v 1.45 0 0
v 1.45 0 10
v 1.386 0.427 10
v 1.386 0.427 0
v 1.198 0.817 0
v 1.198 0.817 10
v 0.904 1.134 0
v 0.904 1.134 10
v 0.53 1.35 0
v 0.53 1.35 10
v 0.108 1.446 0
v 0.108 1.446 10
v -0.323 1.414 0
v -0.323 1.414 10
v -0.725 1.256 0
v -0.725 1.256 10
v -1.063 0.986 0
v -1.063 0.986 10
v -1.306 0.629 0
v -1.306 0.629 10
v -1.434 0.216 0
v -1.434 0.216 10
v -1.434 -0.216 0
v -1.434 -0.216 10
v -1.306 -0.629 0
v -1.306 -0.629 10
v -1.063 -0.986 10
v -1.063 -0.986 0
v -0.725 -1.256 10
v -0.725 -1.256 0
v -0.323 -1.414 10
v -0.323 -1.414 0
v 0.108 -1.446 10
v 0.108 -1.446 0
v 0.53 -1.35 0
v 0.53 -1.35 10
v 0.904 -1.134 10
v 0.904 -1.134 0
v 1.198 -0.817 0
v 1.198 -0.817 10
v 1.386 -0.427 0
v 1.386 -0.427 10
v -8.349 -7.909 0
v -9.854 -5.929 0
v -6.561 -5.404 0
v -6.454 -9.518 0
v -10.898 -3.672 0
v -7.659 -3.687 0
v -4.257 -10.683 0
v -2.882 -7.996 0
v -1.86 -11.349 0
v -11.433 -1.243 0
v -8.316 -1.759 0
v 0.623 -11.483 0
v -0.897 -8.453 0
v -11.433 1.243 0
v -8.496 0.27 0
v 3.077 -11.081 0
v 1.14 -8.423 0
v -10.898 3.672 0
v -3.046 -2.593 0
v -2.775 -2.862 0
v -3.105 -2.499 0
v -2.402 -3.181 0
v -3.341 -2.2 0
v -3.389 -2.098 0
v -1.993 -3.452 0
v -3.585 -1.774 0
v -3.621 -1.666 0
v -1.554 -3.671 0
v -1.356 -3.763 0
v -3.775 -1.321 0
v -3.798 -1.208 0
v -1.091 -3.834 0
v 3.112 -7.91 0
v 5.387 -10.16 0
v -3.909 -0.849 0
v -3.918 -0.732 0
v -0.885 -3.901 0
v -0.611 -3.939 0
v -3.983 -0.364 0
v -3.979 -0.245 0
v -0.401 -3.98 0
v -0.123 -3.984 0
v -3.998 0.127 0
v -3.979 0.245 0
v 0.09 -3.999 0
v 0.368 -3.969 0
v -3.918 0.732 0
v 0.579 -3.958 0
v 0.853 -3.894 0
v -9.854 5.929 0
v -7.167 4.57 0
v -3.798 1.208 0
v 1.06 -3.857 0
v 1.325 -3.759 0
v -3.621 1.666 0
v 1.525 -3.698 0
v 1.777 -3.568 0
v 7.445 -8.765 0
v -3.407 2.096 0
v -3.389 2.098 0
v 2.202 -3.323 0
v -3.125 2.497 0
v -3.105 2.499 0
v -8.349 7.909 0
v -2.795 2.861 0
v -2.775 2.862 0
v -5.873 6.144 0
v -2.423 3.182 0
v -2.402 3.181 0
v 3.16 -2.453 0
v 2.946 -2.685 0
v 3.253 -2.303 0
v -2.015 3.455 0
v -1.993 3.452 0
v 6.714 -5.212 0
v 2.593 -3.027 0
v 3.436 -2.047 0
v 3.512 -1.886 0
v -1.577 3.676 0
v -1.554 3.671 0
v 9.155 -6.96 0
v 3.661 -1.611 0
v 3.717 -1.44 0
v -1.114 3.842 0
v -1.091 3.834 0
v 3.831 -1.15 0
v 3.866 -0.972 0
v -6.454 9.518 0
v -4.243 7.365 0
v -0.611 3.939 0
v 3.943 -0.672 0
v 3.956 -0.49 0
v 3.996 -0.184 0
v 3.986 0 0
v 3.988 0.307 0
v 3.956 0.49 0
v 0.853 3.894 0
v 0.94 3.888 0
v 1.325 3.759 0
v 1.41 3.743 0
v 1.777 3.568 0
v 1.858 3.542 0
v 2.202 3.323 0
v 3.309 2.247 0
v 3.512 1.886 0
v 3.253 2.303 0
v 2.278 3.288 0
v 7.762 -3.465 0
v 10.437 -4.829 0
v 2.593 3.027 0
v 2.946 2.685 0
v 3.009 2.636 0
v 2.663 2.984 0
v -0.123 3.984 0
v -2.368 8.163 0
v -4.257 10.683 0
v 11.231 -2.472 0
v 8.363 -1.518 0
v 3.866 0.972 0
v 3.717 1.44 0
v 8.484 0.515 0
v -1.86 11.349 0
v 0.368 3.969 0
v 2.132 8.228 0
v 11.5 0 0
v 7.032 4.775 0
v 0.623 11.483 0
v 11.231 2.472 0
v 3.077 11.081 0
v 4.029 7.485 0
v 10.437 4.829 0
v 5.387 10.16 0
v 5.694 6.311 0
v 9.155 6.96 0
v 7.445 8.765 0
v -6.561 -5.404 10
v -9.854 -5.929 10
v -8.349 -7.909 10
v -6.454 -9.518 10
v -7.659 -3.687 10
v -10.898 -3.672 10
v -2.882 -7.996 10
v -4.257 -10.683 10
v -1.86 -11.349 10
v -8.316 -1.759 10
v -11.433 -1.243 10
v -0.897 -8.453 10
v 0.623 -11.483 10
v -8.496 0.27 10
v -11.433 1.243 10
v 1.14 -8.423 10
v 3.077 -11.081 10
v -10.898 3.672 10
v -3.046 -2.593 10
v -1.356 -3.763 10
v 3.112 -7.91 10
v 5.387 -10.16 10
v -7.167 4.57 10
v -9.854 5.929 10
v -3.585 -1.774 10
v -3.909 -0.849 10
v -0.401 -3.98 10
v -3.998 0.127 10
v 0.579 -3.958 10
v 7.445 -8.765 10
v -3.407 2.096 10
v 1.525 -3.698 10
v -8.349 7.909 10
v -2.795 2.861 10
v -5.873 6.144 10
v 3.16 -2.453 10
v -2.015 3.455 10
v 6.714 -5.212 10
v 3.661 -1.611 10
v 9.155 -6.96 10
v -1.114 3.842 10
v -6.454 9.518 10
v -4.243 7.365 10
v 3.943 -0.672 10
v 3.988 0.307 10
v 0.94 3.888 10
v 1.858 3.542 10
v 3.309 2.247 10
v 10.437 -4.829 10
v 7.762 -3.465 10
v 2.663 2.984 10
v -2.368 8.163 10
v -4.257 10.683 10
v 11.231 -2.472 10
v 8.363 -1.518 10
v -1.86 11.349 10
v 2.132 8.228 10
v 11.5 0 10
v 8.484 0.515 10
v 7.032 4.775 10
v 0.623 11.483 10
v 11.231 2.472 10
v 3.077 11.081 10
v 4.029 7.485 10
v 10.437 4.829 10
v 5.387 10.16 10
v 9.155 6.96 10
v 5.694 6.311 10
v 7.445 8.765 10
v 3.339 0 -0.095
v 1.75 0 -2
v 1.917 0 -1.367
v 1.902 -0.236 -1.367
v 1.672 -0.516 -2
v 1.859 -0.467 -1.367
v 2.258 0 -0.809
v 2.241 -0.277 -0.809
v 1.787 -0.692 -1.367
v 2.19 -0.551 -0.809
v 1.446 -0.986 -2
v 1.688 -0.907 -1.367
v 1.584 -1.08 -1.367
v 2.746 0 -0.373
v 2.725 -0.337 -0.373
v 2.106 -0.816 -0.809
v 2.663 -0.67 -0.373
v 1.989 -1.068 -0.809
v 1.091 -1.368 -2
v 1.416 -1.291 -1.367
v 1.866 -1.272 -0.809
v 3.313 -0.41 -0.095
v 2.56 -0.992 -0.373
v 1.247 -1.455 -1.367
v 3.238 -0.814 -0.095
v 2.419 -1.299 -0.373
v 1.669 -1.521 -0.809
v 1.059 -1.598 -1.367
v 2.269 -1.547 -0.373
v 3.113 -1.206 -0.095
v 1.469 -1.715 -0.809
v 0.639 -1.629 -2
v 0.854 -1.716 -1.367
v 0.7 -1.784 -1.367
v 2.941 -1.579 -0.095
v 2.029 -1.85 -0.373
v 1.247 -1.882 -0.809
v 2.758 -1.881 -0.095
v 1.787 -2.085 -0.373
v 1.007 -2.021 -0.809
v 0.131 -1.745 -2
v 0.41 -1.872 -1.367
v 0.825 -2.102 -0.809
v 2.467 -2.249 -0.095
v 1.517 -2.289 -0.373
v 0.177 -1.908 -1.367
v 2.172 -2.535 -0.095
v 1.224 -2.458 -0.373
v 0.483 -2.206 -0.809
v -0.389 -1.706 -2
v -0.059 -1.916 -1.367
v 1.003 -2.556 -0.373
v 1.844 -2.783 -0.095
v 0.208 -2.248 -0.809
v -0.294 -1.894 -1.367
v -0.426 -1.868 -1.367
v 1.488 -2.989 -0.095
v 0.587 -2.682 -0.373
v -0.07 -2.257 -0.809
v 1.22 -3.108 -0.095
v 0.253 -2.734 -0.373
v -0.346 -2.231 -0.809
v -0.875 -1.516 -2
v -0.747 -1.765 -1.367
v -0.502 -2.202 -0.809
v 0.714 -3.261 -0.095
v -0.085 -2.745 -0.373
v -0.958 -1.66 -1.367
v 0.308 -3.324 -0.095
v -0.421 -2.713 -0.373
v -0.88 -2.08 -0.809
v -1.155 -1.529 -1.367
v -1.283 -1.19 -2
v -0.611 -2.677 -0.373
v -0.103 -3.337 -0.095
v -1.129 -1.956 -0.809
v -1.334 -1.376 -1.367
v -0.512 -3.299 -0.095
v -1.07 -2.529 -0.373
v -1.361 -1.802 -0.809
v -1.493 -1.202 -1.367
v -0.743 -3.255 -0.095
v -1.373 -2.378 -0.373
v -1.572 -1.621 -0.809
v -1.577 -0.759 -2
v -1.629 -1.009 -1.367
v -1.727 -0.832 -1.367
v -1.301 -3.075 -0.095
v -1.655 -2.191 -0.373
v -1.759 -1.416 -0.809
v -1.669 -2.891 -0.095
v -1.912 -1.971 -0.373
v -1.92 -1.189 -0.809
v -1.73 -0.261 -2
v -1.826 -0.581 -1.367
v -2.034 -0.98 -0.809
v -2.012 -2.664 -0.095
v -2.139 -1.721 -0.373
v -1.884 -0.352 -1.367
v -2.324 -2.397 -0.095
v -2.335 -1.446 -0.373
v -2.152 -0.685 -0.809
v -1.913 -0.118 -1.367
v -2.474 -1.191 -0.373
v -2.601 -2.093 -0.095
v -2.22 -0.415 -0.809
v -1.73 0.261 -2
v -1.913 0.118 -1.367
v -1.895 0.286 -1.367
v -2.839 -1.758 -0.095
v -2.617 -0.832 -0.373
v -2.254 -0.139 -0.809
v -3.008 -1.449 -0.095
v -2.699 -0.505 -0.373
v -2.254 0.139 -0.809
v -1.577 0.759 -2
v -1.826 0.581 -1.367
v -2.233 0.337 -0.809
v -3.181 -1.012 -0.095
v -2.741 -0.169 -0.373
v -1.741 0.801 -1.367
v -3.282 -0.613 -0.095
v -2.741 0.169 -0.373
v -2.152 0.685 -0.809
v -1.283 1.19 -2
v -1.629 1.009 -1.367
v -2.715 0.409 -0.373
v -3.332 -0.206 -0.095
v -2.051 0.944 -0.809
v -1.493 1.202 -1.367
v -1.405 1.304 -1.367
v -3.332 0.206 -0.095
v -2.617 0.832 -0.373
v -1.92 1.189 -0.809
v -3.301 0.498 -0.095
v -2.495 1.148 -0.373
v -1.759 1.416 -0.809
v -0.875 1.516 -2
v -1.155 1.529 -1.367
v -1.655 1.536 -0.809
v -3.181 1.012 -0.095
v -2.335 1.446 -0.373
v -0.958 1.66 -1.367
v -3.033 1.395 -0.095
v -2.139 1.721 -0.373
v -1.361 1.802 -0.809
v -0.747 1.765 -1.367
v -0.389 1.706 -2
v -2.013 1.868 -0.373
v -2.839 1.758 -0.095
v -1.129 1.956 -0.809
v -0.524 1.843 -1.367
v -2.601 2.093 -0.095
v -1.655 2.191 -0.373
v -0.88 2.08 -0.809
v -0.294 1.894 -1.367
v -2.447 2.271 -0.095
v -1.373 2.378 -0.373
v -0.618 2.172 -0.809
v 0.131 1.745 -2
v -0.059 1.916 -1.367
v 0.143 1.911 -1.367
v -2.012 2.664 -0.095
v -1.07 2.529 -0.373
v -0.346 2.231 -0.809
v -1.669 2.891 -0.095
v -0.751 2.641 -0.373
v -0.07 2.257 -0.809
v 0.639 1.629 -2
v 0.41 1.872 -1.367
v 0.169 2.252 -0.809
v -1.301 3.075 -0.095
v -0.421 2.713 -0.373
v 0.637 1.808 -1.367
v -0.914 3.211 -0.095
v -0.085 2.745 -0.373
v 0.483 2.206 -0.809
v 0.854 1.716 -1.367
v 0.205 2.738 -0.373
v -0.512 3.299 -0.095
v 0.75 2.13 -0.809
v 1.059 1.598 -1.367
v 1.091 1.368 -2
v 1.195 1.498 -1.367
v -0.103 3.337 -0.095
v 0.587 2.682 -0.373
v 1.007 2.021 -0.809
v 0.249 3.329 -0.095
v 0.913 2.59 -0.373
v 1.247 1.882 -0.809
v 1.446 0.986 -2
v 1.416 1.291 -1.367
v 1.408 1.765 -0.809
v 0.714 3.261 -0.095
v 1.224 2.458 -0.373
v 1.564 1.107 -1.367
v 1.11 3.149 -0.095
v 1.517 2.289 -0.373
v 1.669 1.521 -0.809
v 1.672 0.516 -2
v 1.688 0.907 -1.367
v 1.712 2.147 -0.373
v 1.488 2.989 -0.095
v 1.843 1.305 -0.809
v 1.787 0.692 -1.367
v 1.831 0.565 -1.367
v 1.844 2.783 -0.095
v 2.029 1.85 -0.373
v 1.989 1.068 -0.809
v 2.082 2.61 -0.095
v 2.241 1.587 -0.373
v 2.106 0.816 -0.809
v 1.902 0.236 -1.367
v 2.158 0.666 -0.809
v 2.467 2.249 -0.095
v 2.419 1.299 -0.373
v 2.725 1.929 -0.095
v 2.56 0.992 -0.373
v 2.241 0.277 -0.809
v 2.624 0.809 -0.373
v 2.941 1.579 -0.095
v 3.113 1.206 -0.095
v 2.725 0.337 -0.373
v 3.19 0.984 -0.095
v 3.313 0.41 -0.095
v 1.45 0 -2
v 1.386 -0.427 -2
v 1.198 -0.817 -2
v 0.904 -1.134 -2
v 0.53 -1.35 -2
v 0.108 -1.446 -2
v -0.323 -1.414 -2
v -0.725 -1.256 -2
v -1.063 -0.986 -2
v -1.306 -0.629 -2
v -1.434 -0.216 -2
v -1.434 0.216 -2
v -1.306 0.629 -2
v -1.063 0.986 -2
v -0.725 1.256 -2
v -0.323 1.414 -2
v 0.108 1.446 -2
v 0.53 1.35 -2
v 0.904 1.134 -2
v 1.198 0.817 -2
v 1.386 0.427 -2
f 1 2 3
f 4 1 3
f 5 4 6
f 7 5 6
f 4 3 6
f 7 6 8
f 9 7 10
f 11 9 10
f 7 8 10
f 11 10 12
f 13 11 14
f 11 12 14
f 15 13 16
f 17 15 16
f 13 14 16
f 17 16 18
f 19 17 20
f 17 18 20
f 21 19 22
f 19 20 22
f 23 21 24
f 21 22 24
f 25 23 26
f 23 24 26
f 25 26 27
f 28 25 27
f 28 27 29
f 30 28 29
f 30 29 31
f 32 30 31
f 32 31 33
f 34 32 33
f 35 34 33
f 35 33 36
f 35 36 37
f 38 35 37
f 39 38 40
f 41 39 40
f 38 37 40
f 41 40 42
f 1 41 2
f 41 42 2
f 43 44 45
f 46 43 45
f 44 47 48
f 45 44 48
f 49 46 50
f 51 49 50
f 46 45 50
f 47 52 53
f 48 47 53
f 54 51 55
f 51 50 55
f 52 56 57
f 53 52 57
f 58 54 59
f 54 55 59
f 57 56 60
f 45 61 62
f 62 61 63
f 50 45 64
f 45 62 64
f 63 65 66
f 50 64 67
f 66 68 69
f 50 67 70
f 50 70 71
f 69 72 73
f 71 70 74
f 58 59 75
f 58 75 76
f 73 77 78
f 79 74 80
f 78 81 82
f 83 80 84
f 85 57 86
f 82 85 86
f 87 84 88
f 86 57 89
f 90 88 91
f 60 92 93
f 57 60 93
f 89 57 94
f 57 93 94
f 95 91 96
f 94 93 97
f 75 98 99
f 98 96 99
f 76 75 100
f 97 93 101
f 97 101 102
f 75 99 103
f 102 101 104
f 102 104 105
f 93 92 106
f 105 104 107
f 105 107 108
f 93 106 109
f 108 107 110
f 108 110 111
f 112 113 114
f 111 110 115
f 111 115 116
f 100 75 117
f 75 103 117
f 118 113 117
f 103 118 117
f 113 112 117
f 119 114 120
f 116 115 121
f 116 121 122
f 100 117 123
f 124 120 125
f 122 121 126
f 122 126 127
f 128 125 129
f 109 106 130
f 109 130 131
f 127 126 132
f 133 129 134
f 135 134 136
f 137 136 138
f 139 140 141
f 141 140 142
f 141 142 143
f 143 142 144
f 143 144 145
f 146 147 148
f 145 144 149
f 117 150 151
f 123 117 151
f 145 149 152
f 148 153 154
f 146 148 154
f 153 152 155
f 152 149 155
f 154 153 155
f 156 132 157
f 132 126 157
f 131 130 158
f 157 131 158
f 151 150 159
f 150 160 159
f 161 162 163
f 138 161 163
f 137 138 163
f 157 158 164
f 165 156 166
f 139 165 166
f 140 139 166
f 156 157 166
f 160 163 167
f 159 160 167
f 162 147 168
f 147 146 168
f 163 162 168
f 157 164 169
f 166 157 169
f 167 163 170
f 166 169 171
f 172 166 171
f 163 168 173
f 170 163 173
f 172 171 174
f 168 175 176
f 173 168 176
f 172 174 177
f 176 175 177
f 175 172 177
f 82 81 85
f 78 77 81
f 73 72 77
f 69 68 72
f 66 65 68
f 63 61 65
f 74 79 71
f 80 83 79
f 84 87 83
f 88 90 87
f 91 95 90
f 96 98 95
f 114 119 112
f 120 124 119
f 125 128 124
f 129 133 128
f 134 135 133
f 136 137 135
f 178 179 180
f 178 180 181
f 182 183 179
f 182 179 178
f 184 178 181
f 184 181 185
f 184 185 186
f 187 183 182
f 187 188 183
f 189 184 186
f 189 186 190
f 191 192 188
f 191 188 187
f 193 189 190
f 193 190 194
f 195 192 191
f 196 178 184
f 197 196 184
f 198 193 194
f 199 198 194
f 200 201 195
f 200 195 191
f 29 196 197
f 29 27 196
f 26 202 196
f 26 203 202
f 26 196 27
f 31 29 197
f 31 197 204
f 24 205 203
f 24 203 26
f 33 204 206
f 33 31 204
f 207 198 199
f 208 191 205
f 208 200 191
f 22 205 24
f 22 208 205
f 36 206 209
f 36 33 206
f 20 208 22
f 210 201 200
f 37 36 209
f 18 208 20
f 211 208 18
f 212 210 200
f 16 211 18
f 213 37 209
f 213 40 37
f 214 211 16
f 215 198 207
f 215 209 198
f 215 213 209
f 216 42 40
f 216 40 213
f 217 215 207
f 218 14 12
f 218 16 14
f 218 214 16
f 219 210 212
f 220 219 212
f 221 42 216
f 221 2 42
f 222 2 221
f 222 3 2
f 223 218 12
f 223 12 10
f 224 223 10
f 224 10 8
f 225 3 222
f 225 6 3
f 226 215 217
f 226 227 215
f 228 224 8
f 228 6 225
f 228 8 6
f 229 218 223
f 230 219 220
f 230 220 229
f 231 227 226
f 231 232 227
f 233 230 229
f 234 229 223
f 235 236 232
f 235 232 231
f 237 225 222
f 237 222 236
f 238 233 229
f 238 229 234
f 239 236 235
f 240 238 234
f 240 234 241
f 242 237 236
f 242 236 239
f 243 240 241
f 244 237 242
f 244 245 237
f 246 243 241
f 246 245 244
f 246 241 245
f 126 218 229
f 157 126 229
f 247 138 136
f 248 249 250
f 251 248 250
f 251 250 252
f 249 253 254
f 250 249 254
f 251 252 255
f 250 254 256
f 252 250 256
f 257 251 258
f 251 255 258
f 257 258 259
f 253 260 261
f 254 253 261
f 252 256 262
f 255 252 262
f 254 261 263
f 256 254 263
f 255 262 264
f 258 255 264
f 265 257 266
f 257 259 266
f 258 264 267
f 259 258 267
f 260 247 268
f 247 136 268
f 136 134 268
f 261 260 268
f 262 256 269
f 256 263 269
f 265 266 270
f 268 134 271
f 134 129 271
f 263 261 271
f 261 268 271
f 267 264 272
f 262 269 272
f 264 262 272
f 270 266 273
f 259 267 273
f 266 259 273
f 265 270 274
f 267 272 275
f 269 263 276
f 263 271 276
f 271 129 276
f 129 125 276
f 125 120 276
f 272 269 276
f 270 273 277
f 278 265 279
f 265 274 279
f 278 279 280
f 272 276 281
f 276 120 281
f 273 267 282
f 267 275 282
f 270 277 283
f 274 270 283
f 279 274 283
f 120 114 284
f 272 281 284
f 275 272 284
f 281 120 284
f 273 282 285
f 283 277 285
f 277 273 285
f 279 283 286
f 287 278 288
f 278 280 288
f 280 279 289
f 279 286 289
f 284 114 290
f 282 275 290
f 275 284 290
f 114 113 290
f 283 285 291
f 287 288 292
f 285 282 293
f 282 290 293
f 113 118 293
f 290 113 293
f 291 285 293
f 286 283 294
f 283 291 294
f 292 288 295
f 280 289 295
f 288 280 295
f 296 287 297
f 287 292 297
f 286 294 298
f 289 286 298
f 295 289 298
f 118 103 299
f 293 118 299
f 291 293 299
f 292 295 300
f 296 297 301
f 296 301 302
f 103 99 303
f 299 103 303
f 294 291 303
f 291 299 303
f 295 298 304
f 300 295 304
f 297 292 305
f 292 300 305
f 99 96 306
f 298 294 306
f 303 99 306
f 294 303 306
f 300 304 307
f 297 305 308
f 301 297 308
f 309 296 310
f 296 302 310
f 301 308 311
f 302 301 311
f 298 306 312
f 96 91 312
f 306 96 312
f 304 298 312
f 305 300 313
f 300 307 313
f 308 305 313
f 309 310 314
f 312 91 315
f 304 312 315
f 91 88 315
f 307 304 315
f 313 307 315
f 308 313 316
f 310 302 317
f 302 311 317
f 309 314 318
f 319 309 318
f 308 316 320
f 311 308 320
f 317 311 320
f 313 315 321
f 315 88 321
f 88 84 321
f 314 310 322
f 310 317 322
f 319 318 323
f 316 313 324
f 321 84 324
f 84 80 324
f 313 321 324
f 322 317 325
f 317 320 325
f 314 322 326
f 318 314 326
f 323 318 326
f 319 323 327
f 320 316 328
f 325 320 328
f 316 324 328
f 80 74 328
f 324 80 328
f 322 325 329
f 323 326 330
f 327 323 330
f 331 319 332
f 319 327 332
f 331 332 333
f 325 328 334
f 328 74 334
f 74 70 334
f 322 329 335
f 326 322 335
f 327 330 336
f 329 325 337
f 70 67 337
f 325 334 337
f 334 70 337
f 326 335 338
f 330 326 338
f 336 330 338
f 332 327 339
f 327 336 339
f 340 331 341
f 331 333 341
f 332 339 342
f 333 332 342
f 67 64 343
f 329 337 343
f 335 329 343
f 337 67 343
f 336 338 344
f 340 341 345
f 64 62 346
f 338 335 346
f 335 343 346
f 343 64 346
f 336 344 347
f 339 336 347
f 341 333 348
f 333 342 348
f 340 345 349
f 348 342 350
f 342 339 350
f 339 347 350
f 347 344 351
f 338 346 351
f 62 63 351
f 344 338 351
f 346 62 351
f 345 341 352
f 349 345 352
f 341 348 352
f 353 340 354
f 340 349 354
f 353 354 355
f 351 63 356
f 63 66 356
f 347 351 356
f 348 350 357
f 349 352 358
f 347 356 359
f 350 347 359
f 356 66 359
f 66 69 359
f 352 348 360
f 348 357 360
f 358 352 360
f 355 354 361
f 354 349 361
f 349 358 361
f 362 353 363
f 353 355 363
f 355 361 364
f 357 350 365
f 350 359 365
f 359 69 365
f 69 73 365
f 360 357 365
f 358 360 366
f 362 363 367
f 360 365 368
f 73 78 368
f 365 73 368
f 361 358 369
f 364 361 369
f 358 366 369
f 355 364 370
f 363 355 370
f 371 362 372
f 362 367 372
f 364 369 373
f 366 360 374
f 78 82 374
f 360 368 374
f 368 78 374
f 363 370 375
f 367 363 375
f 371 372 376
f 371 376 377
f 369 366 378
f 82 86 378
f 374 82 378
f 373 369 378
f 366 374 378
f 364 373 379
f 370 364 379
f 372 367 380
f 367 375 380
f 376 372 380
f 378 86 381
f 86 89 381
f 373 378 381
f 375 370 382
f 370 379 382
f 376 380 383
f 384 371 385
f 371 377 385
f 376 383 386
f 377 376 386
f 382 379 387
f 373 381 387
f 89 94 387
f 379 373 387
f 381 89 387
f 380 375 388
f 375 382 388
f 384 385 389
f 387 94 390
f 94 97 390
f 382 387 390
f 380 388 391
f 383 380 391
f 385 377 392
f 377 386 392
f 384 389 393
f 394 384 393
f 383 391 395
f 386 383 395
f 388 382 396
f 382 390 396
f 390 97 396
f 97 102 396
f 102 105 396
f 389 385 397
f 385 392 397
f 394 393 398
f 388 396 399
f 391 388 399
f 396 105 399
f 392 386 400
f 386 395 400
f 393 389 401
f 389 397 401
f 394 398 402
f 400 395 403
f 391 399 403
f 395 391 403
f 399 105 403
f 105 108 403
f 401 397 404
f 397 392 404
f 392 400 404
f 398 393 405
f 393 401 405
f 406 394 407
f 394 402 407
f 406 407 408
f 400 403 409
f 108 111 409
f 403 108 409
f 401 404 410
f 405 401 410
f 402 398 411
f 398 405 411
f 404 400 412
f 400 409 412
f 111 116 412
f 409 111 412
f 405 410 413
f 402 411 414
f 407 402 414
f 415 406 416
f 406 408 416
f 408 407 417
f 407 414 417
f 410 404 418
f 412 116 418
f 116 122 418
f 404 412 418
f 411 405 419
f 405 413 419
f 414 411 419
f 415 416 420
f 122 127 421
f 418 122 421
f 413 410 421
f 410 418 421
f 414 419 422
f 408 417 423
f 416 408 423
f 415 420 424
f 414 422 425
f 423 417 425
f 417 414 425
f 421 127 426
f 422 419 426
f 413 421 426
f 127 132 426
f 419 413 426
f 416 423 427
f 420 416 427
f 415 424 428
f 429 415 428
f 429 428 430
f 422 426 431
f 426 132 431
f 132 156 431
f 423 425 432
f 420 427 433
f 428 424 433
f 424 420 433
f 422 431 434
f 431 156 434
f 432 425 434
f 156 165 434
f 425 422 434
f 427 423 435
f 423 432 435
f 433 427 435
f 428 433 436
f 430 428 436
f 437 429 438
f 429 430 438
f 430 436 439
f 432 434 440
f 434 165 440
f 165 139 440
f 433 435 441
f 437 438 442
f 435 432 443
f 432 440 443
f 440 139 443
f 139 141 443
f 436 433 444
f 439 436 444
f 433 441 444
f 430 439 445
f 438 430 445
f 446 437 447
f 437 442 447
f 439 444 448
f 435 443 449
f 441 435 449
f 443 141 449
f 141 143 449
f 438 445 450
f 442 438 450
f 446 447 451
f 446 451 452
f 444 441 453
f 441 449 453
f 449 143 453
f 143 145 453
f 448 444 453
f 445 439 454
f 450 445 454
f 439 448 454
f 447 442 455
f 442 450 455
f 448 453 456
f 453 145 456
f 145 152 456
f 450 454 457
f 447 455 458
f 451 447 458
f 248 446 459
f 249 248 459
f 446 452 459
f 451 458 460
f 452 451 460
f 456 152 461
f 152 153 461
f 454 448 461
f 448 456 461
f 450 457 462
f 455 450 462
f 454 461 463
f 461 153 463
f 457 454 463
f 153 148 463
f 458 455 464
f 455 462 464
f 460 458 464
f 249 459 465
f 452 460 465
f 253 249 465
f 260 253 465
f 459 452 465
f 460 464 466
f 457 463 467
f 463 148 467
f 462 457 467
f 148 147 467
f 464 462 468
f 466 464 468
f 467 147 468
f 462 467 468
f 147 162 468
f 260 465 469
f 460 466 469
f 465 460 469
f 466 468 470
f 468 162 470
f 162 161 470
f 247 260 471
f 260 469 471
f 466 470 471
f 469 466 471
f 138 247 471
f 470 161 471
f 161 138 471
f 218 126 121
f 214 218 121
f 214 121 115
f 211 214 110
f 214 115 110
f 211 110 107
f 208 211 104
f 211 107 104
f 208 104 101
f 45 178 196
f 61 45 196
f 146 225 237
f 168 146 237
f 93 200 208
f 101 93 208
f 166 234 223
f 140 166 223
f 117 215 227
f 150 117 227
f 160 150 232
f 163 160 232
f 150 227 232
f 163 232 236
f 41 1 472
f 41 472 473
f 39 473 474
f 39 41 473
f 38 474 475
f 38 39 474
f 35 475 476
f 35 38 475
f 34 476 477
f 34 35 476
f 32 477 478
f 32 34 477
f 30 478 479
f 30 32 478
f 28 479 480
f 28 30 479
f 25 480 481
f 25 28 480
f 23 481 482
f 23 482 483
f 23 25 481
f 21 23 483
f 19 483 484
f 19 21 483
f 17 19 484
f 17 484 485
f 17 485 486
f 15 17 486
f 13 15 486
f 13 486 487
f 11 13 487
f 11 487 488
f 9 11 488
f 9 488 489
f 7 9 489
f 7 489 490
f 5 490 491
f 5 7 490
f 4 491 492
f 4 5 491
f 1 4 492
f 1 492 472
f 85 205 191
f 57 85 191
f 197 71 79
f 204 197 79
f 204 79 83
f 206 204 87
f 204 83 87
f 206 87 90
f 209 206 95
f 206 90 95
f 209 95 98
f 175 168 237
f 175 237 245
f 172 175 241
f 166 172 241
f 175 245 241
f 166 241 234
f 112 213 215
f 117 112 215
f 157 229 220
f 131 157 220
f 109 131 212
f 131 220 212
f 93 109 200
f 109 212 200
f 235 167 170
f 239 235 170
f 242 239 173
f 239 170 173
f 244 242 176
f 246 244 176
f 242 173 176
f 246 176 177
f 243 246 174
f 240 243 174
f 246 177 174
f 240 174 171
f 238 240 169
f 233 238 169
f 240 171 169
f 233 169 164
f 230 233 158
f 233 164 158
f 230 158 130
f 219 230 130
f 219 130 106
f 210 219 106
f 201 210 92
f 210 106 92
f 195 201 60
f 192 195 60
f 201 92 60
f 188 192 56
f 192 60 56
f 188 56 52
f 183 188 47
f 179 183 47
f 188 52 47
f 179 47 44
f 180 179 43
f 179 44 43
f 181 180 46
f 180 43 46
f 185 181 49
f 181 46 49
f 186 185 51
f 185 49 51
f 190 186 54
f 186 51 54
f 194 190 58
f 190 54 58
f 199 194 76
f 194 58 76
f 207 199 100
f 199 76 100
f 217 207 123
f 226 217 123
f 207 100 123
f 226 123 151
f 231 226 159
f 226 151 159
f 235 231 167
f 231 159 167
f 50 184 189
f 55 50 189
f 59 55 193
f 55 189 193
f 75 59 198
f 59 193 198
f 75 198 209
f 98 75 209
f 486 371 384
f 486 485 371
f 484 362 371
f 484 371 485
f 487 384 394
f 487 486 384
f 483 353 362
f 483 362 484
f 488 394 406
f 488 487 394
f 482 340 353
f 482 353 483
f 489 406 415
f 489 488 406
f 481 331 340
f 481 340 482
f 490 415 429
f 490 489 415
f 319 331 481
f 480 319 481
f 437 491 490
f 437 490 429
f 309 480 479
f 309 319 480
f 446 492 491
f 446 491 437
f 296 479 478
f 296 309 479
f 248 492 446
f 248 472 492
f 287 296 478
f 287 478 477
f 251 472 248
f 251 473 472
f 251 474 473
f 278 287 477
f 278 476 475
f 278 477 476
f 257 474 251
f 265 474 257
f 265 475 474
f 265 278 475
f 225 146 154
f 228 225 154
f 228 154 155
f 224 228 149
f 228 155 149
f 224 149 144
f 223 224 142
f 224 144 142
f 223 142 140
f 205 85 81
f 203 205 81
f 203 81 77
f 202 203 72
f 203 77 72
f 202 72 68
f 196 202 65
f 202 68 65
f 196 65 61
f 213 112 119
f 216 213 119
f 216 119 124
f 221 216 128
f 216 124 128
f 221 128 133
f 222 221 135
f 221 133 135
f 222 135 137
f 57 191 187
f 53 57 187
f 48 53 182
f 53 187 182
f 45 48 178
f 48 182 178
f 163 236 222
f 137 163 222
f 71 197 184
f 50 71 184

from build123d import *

# Parameters (mm, degrees)
SKETCH1_R           = 11.5
BOSS_EXTRUDE1_DEPTH = 10
SKETCH2_R           = 8.5
CUT_EXTRUDE2_DEPTH  = 10
SKETCH4_R           = 4
BOSS_EXTRUDE2_DEPTH = 10
BOSS_EXTRUDE3_START = 10
BOSS_EXTRUDE3_DEPTH = 10
CIRPATTERN1_COUNT   = 5
SKETCH7_R           = 1.45
CUT_EXTRUDE3_DEPTH  = 10
SKETCH8_R           = 1.75
BOSS_EXTRUDE4_DEPTH = 2
CUT_EXTRUDE4_START  = -2
SKETCH9_R           = 1.45
CUT_EXTRUDE4_DEPTH  = 2
FILLET1_R           = 2.25


with BuildPart() as part:
    # Sketch1 → Boss-Extrude1 (new body)
    with BuildSketch(Plane.XY):
        Circle(SKETCH1_R)
    extrude(amount=BOSS_EXTRUDE1_DEPTH)

    # Sketch2 → Cut-Extrude2 (cut)
    with BuildSketch(Plane.XY.offset(10)):
        Circle(SKETCH2_R)
    extrude(amount=-CUT_EXTRUDE2_DEPTH, mode=Mode.SUBTRACT)



with BuildPart() as body_2:
    # Sketch4 → Boss-Extrude2 (new body)
    with BuildSketch(Plane.XY):
        Circle(SKETCH4_R)
    extrude(amount=BOSS_EXTRUDE2_DEPTH)


with BuildPart() as part_1:
    add(part.part)

    add(body_2.part)  # Boss-Extrude3 merges body 2
    # Sketch6 → Boss-Extrude3 (add)
    with BuildSketch(Plane.XY.offset(BOSS_EXTRUDE3_START)):
        with BuildLine():
            Line((-1.114437127, 3.841618134), (-2.368178894, 8.163438536))
            ThreePointArc((-2.368178894, 8.163438536), (-0.122551325, 8.499116494), (2.131821106, 8.228325393))
            Line((2.131821106, 8.228325393), (0.940332104, 3.887901173))
            ThreePointArc((0.940332104, 3.887901173), (-0.090075911, 3.998985663), (-1.114437127, 3.841618134))
        make_face()
    boss_extrude3 = extrude(amount=-BOSS_EXTRUDE3_DEPTH)

    # CirPattern1: Boss-Extrude3 ×5 about axis
    cirpattern1_axis = Axis((0, 0, 0), (0, 0, 1))
    for i in range(1, CIRPATTERN1_COUNT):
        add(boss_extrude3.rotate(cirpattern1_axis, i * 360 / CIRPATTERN1_COUNT))

    # Sketch7 → Cut-Extrude3 (cut)
    with BuildSketch(Plane.XY.offset(10)):
        Circle(SKETCH7_R)
    extrude(amount=-CUT_EXTRUDE3_DEPTH, mode=Mode.SUBTRACT)

    # Sketch8 → Boss-Extrude4 (add)
    with BuildSketch(Plane(origin=(0, 0, 0), x_dir=(-1, 0, 0), z_dir=(0, 0, -1))):
        with Locations(Location((0, 0, 0), (0, 0, 180))):
            Circle(SKETCH8_R)
    extrude(amount=BOSS_EXTRUDE4_DEPTH)

    # Sketch9 → Cut-Extrude4 (cut)
    with BuildSketch(Plane(origin=(0, 0, -2), x_dir=(-1, 0, 0), z_dir=(0, 0, -1)).offset(CUT_EXTRUDE4_START)):
        with Locations(Location((0, 0, 0), (0, 0, 180))):
            Circle(SKETCH9_R)
    extrude(amount=CUT_EXTRUDE4_DEPTH, mode=Mode.SUBTRACT)

    # Fillet1
    # the kernel refuses this fillet: 2.25 mm, written as the material it adds along each edge
    with BuildSketch(Plane(origin=(0, 0, 0), x_dir=(1, 0, 0), z_dir=(0, 1, 0))) as fillet1_piece_1:
        with BuildLine():
            CenterArc((3.986067977, 2.25), FILLET1_R, 186.379370208, 83.620629792)
            Line((1.75, 2), (1.70527864, 1.995))
            ThreePointArc((1.70527864, 1.995), (1.705, 1), (1.705, 0))
            Line((1.705, 0), (1.75, -0.045))
            Line((1.75, -0.045), (3.986067977, -0.045))
            Line((3.986067977, -0.045), (3.986067977, 0))
        make_face()
    revolve(axis=Axis((0, 0, 0), (0, 0, -1)))


solid = part_1.part
